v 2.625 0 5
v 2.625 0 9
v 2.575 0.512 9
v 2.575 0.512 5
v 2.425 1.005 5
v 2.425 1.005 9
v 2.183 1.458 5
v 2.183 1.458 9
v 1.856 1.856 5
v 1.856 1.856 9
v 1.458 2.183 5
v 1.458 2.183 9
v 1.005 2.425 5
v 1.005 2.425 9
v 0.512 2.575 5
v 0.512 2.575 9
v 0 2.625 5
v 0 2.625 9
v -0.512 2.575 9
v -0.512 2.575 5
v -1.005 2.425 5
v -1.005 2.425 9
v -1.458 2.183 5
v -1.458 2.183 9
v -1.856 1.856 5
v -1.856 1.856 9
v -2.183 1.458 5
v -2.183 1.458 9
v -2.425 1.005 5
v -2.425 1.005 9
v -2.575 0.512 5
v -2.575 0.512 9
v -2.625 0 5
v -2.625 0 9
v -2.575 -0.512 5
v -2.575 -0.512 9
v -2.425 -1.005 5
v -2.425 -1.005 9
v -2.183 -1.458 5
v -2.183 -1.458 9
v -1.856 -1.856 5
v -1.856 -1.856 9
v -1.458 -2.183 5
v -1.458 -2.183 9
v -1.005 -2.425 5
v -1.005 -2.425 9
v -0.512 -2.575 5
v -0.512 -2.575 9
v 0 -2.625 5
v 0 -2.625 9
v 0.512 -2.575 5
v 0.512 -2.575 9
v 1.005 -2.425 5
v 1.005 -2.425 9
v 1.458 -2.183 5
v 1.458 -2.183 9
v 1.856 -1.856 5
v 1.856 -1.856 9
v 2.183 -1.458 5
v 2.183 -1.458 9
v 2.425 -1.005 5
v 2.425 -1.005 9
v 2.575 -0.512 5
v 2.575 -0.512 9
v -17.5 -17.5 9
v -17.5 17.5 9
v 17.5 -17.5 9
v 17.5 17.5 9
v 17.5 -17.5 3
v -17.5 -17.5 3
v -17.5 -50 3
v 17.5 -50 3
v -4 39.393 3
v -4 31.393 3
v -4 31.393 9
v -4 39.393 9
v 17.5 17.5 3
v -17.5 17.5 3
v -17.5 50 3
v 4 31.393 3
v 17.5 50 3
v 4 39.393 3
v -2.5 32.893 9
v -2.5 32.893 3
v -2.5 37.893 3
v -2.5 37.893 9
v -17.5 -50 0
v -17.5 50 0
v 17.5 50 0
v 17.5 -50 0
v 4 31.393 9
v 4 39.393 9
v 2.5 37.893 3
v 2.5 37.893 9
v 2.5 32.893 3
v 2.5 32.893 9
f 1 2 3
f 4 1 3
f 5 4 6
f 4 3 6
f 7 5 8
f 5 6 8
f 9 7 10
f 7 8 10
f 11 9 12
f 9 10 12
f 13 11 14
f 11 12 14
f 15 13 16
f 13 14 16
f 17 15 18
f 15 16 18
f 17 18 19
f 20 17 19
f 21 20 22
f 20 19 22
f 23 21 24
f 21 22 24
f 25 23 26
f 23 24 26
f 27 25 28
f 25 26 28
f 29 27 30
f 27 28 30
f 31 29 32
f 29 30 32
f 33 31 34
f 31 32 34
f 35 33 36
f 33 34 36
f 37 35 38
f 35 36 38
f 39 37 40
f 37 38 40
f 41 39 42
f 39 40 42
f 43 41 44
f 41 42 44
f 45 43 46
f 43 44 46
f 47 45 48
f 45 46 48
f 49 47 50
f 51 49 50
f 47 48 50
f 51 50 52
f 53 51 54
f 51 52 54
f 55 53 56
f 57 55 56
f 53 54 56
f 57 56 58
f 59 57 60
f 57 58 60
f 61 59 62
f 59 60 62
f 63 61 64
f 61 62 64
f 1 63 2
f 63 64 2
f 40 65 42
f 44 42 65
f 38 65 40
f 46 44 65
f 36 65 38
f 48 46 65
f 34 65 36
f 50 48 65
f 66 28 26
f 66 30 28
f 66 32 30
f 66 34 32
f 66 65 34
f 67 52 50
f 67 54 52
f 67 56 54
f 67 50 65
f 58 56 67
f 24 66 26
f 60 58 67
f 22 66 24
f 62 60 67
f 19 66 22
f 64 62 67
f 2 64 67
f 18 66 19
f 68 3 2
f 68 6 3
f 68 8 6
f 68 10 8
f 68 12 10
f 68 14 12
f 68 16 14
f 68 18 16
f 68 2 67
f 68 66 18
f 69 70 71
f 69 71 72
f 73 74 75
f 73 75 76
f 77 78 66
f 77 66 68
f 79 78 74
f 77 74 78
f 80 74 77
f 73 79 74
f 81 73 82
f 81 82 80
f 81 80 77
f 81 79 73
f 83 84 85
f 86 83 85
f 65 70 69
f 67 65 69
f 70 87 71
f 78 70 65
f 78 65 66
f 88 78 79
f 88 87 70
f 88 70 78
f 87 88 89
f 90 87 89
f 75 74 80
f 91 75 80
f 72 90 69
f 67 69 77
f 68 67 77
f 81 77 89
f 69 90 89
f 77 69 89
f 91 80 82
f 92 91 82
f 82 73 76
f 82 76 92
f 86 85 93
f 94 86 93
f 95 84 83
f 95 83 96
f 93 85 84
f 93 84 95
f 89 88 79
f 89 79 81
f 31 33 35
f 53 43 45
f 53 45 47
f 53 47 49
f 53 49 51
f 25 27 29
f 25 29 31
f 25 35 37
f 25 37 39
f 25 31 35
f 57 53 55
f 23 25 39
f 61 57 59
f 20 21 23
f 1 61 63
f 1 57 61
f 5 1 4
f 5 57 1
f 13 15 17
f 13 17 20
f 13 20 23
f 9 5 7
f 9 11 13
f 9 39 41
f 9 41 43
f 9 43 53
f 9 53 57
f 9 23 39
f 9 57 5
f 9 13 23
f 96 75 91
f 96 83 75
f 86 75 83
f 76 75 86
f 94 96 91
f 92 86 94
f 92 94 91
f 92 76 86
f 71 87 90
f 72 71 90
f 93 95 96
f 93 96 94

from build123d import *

# Parameters (mm, degrees)
F0_W     = 35
F0_H     = 100
F1_DEPTH = 3
F2_W     = 35
F2_H     = 35
F3_DEPTH = 6
F4_R     = 2.625
F5_DEPTH = 4
F6_W     = 8
F6_H     = 8
F6_W_2   = 5
F6_H_2   = 5
F7_DEPTH = 6


with BuildPart() as f1:
    # F0 (on Top) → F1 (new body)
    with BuildSketch(Plane.XY):
        Rectangle(F0_W, F0_H)
    extrude(amount=F1_DEPTH)

    # F2 (on face) → F3 (join)
    with BuildSketch(Plane.XY.offset(3)):
        Rectangle(F2_W, F2_H)
    extrude(amount=F3_DEPTH)

    # F4 (on face) → F5 (cut)
    with BuildSketch(Plane.XY.offset(9)):
        Circle(F4_R)
    extrude(amount=-F5_DEPTH, mode=Mode.SUBTRACT)

    # F6 (on face) → F7 (join)
    with BuildSketch(Plane.XY.offset(3)):
        with Locations((0, 35.393093)):
            Rectangle(F6_W, F6_H)
        with Locations((0, 35.393093)):
            Rectangle(F6_W_2, F6_H_2, mode=Mode.SUBTRACT)
    extrude(amount=F7_DEPTH)


solid = f1.part
